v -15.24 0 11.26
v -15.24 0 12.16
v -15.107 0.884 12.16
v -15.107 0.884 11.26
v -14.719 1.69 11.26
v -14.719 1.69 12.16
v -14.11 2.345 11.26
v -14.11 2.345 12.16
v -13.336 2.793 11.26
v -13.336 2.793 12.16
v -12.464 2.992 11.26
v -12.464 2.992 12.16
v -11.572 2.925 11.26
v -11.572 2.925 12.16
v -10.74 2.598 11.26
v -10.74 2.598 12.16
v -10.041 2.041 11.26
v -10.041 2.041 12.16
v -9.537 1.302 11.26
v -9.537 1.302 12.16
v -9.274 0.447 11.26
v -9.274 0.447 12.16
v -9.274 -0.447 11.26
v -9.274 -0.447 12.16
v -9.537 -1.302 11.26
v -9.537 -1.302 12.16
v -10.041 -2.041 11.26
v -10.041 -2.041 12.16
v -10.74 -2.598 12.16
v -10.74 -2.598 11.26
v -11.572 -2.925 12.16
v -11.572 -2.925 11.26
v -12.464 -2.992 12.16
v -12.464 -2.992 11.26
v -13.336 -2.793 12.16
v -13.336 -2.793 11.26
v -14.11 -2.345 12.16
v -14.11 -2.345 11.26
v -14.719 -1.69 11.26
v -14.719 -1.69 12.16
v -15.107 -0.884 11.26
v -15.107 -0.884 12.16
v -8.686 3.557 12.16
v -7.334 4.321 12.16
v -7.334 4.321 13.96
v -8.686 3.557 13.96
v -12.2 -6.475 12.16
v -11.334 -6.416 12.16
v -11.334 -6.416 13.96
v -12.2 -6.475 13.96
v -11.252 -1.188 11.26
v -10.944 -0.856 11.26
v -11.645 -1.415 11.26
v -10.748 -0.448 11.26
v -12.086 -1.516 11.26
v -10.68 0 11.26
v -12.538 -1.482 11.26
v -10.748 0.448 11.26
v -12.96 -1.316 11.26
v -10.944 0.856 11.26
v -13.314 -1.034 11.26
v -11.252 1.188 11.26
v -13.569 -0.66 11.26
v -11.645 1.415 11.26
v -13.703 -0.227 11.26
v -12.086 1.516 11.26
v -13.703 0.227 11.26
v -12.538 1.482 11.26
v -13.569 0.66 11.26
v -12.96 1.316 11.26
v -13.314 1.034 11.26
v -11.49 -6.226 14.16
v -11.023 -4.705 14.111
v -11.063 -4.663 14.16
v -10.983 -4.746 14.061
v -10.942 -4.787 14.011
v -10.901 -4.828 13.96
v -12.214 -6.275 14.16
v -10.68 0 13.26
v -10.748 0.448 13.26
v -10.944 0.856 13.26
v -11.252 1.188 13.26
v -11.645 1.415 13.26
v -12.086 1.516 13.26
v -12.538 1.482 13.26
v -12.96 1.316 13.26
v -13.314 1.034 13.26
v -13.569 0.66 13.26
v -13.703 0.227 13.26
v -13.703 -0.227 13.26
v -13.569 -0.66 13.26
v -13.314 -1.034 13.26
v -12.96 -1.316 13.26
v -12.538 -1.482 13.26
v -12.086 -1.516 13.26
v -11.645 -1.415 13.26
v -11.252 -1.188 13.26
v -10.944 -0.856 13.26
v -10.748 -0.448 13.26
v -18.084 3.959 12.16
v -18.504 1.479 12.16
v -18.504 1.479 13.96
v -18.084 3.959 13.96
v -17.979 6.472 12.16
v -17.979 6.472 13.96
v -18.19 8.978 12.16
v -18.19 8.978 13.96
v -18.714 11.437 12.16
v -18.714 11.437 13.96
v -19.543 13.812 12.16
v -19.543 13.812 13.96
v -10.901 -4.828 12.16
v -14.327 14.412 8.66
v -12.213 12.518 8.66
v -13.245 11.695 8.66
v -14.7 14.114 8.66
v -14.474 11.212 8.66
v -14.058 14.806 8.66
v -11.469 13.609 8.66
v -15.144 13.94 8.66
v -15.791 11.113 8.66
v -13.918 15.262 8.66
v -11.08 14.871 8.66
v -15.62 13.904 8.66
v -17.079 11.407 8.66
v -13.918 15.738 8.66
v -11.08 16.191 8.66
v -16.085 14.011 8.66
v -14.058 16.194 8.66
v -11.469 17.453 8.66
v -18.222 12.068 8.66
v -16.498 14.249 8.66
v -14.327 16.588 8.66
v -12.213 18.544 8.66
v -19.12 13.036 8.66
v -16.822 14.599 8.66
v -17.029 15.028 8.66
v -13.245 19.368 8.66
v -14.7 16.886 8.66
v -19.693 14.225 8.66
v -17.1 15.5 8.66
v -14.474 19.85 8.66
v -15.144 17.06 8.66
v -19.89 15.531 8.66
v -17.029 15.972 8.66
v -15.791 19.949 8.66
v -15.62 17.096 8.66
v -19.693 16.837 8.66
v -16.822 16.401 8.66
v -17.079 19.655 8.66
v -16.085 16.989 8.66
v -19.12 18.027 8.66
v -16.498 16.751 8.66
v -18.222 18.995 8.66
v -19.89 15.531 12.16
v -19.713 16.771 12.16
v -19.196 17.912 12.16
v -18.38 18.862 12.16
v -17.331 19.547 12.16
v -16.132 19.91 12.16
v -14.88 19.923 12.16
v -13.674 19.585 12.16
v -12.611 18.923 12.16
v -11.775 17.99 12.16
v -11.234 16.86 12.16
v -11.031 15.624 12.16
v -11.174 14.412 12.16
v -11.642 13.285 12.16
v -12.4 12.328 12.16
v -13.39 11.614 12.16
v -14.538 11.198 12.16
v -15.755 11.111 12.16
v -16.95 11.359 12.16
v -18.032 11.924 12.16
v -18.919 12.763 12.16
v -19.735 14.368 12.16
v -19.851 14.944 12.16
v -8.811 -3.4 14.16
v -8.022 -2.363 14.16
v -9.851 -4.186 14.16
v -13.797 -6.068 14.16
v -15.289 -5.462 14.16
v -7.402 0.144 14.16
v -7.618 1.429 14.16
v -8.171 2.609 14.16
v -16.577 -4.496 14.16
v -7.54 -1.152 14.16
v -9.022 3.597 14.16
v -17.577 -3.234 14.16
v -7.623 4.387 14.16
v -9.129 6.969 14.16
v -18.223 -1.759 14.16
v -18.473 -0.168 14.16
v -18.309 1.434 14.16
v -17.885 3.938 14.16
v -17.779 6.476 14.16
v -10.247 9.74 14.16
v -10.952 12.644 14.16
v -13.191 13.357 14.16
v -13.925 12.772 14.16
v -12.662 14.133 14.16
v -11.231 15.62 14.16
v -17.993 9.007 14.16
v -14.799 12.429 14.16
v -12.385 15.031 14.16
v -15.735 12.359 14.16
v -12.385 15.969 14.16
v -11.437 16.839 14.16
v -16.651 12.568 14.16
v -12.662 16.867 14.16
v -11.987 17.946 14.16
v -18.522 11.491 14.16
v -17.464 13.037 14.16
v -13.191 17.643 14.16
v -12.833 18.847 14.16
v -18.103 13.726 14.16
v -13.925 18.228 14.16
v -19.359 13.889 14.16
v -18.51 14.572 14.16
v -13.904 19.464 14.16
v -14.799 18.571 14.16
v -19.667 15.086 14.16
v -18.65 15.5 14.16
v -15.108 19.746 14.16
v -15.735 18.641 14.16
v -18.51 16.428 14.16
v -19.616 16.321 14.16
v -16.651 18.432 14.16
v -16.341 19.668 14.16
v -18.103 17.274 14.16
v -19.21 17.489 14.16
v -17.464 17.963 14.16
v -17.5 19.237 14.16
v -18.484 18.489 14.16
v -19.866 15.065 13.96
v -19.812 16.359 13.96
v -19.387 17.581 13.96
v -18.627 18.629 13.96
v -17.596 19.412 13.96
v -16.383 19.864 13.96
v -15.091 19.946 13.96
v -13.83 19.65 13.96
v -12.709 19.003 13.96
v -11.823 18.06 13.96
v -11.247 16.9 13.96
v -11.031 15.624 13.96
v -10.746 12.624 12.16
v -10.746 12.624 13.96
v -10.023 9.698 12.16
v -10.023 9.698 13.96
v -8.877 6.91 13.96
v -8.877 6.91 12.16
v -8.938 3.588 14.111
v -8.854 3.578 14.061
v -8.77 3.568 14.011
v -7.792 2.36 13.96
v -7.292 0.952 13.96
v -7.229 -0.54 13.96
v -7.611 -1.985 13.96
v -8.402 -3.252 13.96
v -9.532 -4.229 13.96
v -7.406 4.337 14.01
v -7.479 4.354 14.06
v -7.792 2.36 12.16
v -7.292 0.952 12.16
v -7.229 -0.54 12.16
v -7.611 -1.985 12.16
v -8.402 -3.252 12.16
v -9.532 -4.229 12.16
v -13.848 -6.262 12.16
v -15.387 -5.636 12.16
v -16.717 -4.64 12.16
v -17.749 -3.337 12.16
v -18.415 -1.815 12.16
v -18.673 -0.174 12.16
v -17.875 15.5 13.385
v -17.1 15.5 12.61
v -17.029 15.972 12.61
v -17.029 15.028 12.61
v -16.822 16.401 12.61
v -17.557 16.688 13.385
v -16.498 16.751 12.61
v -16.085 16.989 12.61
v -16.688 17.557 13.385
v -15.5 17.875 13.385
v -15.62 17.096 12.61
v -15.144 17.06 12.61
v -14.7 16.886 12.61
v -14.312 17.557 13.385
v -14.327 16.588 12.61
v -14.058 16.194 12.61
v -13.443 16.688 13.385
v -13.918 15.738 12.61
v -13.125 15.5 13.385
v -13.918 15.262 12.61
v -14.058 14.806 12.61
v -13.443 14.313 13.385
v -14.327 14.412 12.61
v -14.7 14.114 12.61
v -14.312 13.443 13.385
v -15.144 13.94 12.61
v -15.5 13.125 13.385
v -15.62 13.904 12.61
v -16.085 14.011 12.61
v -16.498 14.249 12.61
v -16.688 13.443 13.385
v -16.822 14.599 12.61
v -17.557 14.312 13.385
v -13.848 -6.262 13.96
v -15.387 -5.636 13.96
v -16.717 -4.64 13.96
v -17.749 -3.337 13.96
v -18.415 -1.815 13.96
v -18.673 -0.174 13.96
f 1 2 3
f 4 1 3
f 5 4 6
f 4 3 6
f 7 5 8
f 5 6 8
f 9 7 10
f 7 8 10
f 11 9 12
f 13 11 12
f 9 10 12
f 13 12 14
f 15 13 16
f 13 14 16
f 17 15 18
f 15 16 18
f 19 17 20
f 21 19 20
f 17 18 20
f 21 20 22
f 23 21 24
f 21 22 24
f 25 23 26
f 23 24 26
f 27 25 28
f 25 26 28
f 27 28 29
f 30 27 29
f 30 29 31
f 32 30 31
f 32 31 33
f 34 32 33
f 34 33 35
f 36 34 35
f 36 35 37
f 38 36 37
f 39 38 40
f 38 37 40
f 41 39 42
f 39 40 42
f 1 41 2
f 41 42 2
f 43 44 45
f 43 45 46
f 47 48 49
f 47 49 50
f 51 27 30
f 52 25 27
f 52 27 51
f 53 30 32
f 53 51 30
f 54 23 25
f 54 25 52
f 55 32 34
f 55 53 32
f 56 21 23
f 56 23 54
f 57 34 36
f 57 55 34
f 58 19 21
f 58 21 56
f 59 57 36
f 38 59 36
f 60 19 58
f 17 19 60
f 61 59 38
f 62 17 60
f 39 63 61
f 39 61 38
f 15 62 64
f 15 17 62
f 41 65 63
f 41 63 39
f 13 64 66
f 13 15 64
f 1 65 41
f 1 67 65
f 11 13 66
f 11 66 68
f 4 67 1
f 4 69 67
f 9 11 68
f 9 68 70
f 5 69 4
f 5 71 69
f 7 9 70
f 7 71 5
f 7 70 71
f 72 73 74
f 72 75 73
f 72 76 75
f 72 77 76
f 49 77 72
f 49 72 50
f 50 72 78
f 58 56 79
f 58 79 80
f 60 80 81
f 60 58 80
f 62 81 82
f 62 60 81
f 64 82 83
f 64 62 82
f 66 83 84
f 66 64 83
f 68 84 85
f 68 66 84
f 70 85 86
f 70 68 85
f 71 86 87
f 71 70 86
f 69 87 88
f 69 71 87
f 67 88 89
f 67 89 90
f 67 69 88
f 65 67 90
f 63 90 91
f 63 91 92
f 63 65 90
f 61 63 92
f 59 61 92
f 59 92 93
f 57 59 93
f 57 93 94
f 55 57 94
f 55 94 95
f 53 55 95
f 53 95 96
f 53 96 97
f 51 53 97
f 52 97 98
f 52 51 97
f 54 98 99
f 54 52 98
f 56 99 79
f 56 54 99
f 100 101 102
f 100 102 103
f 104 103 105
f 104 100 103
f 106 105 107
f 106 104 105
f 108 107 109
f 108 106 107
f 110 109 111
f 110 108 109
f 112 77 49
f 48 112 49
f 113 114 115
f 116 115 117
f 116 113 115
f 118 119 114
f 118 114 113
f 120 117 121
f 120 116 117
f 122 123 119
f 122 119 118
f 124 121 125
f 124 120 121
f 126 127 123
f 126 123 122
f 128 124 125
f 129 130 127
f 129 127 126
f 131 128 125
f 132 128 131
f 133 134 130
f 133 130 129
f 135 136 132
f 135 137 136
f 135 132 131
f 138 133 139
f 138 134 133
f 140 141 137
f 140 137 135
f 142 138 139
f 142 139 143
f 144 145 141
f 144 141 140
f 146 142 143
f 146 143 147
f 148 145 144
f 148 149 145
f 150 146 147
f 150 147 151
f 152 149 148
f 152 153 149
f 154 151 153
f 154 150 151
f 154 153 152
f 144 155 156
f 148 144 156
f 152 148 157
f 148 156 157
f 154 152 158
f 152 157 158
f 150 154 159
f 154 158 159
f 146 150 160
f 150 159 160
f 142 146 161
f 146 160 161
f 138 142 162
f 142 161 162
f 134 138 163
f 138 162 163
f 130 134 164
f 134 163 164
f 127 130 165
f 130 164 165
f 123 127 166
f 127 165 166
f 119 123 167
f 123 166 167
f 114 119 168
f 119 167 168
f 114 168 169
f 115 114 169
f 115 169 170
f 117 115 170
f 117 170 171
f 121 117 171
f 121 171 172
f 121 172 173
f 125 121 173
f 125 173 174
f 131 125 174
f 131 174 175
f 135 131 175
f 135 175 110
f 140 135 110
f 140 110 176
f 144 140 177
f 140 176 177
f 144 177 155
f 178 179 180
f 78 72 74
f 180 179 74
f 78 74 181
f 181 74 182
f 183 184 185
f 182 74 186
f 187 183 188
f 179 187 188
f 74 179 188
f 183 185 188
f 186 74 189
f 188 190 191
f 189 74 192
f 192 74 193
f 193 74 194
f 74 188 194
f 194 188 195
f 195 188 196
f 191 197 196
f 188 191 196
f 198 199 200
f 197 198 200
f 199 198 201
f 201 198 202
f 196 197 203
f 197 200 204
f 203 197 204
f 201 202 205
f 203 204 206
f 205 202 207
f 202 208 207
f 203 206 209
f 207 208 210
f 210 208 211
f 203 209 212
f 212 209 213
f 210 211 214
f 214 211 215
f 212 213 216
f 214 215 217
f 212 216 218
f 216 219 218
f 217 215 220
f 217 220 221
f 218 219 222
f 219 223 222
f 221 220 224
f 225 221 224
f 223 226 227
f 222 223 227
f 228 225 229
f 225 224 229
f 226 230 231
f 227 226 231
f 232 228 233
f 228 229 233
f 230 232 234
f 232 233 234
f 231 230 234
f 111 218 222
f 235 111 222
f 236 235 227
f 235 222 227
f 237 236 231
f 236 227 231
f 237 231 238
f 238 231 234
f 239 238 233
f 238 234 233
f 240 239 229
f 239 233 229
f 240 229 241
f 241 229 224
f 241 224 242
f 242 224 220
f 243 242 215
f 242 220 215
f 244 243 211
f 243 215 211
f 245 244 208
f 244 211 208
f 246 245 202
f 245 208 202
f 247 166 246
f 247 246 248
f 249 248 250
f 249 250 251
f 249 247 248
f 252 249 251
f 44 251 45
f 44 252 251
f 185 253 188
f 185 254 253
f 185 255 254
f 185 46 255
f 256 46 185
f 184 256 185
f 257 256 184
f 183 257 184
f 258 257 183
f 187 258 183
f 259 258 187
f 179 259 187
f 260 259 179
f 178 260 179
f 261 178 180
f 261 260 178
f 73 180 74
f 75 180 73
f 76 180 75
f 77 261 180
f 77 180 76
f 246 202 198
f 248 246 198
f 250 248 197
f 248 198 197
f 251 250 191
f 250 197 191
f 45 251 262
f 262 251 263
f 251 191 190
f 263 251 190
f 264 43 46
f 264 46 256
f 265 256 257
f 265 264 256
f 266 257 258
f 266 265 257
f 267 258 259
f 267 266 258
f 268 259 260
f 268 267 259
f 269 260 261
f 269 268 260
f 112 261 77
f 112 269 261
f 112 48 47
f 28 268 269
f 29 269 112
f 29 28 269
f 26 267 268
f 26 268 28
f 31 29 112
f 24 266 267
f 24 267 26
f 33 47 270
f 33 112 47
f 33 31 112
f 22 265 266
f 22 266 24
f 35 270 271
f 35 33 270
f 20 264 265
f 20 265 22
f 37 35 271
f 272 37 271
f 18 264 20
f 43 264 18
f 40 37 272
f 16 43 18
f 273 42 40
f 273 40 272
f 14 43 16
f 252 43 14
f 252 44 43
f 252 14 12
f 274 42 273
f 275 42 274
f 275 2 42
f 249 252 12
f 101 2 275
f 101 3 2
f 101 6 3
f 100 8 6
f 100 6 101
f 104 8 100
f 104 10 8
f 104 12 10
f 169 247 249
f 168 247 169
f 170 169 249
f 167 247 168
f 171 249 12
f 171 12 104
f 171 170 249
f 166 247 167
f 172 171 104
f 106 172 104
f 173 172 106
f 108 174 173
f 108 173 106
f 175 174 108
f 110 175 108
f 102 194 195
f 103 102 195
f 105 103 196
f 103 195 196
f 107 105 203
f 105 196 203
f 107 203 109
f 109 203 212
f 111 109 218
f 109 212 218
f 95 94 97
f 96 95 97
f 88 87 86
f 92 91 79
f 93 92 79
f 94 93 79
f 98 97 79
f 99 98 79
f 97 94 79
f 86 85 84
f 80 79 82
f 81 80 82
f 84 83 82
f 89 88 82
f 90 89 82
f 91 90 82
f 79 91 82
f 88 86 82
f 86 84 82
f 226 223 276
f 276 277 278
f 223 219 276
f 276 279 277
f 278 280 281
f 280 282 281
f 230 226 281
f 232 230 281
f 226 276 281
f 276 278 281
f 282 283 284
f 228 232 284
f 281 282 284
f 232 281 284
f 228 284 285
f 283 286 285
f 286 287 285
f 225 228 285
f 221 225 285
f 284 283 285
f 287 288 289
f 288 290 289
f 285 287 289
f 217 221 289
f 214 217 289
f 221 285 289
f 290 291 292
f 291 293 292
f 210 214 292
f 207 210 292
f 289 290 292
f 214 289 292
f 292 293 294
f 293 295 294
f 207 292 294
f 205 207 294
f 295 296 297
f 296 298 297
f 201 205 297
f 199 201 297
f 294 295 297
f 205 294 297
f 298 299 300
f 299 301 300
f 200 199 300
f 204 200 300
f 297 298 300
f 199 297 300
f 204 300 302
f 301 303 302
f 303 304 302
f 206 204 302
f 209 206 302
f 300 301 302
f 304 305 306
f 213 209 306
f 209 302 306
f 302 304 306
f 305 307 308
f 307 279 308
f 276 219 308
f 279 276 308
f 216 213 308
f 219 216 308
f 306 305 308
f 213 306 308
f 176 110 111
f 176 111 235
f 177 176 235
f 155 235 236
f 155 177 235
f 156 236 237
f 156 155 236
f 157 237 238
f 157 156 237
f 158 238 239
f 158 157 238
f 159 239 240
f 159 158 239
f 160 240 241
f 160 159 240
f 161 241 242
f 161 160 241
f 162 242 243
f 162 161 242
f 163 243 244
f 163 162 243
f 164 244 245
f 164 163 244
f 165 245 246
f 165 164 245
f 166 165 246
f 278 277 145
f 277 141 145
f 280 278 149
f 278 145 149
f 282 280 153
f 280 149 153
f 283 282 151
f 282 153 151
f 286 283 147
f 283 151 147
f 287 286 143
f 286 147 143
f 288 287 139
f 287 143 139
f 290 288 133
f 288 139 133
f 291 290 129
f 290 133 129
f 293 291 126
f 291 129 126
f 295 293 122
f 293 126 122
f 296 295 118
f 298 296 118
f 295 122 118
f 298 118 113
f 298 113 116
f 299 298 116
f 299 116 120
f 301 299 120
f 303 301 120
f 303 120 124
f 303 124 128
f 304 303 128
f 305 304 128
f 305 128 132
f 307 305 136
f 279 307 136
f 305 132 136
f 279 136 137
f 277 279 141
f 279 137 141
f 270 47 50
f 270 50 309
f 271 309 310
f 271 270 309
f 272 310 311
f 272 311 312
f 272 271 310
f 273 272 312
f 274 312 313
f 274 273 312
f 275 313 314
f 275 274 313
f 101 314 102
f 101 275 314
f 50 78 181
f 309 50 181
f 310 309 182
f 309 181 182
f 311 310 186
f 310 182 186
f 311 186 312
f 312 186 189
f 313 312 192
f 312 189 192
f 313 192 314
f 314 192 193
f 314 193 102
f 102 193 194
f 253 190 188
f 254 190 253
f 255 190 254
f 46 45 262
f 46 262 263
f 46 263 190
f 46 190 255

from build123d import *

# Parameters (mm, degrees)
EXTRUDE_1_DEPTH              = 2
SKETCH_2_R                   = 4.43
EXTRUDE_2_DEPTH              = 3.5
HOLE_WIZARD_M3_1_D           = 3.2
HOLE_WIZARD_M3_1_CSINK_D     = 6.3
HOLE_WIZARD_M3_1_CSINK_ANGLE = 90
SKETCH_8_R                   = 3
EXTRUDE_3_DEPTH              = 0.9
SKETCH_10_R                  = 1.52
CUT_EXTRUDE_1_DEPTH          = 2
CHAMFER_1_SIZE               = 0.2


with BuildPart() as part:
    # 草图1 → 凸台-拉伸1 (new body)
    with BuildSketch(Plane(origin=(0, 0, 12.16), x_dir=(-1, 0, 0), z_dir=(0, 0, -1))):
        with BuildLine():
            Line((10.90083304, -4.828267309), (11.334013857, -6.416349492))
            Line((11.334013857, -6.416349492), (12.2, -6.475))
            ThreePointArc((12.2, -6.475), (17.274650028, -4.0216355), (18.503750642, 1.479308233))
            ThreePointArc((18.503750642, 1.479308233), (18.045416815, 7.727850312), (19.542869864, 13.811597708))
            ThreePointArc((19.542869864, 13.811597708), (16.382825591, 19.863959761), (11.031173747, 15.624055427))
            ThreePointArc((11.031173747, 15.624055427), (10.022718521, 9.69776671), (7.334091643, 4.321042298))
            Line((7.334091643, 4.321042298), (8.685883448, 3.556822298))
            ThreePointArc((8.685883448, 3.556822298), (7.365813774, -1.276966534), (10.90083304, -4.828267309))
        make_face()
    extrude(amount=-EXTRUDE_1_DEPTH)

    # 草图2 → 凸台-拉伸2 (add)
    with BuildSketch(Plane(origin=(0, 0, 12.16), x_dir=(-1, 0, 0), z_dir=(0, 0, -1))):
        with Locations((15.460198425, 15.531101684)):
            Circle(SKETCH_2_R)
    extrude(amount=EXTRUDE_2_DEPTH)

    # M3 平头机械螺钉的锥形沉头孔1 (through all)
    with Locations(Plane.XY.offset(14.16)):
        with Locations((-15.5, 15.5)):
            CounterSinkHole(HOLE_WIZARD_M3_1_D / 2, HOLE_WIZARD_M3_1_CSINK_D / 2, counter_sink_angle=HOLE_WIZARD_M3_1_CSINK_ANGLE)

    # 草图8 → 凸台-拉伸3 (add)
    with BuildSketch(Plane(origin=(0, 0, 12.16), x_dir=(-1, 0, 0), z_dir=(0, 0, -1))):
        with Locations((12.24, 0)):
            Circle(SKETCH_8_R)
    extrude(amount=EXTRUDE_3_DEPTH)

    # 草图10 → 切除-拉伸1 (cut)
    with BuildSketch(Plane.XY.offset(11.26)):
        with Locations((-12.2, 0)):
            Circle(SKETCH_10_R)
    extrude(amount=CUT_EXTRUDE_1_DEPTH, mode=Mode.SUBTRACT)

    # 倒角1
    chamfer_1_edges = [part.edges().sort_by_distance(p)[0] for p in [
        (-16.382825591, 19.863959761, 14.16),
        (-10.022718521, 9.69776671, 14.16),
        (-8.009987545, 3.938932298, 14.16),
        (-7.365813774, -1.276966534, 14.16),
        (-11.117423449, -5.622308401, 14.16),
        (-11.767006928, -6.445674746, 14.16),
        (-17.274650028, -4.0216355, 14.16),
        (-18.045416815, 7.727850312, 14.16),
    ]]
    chamfer(chamfer_1_edges, length=CHAMFER_1_SIZE)


solid = part.part
